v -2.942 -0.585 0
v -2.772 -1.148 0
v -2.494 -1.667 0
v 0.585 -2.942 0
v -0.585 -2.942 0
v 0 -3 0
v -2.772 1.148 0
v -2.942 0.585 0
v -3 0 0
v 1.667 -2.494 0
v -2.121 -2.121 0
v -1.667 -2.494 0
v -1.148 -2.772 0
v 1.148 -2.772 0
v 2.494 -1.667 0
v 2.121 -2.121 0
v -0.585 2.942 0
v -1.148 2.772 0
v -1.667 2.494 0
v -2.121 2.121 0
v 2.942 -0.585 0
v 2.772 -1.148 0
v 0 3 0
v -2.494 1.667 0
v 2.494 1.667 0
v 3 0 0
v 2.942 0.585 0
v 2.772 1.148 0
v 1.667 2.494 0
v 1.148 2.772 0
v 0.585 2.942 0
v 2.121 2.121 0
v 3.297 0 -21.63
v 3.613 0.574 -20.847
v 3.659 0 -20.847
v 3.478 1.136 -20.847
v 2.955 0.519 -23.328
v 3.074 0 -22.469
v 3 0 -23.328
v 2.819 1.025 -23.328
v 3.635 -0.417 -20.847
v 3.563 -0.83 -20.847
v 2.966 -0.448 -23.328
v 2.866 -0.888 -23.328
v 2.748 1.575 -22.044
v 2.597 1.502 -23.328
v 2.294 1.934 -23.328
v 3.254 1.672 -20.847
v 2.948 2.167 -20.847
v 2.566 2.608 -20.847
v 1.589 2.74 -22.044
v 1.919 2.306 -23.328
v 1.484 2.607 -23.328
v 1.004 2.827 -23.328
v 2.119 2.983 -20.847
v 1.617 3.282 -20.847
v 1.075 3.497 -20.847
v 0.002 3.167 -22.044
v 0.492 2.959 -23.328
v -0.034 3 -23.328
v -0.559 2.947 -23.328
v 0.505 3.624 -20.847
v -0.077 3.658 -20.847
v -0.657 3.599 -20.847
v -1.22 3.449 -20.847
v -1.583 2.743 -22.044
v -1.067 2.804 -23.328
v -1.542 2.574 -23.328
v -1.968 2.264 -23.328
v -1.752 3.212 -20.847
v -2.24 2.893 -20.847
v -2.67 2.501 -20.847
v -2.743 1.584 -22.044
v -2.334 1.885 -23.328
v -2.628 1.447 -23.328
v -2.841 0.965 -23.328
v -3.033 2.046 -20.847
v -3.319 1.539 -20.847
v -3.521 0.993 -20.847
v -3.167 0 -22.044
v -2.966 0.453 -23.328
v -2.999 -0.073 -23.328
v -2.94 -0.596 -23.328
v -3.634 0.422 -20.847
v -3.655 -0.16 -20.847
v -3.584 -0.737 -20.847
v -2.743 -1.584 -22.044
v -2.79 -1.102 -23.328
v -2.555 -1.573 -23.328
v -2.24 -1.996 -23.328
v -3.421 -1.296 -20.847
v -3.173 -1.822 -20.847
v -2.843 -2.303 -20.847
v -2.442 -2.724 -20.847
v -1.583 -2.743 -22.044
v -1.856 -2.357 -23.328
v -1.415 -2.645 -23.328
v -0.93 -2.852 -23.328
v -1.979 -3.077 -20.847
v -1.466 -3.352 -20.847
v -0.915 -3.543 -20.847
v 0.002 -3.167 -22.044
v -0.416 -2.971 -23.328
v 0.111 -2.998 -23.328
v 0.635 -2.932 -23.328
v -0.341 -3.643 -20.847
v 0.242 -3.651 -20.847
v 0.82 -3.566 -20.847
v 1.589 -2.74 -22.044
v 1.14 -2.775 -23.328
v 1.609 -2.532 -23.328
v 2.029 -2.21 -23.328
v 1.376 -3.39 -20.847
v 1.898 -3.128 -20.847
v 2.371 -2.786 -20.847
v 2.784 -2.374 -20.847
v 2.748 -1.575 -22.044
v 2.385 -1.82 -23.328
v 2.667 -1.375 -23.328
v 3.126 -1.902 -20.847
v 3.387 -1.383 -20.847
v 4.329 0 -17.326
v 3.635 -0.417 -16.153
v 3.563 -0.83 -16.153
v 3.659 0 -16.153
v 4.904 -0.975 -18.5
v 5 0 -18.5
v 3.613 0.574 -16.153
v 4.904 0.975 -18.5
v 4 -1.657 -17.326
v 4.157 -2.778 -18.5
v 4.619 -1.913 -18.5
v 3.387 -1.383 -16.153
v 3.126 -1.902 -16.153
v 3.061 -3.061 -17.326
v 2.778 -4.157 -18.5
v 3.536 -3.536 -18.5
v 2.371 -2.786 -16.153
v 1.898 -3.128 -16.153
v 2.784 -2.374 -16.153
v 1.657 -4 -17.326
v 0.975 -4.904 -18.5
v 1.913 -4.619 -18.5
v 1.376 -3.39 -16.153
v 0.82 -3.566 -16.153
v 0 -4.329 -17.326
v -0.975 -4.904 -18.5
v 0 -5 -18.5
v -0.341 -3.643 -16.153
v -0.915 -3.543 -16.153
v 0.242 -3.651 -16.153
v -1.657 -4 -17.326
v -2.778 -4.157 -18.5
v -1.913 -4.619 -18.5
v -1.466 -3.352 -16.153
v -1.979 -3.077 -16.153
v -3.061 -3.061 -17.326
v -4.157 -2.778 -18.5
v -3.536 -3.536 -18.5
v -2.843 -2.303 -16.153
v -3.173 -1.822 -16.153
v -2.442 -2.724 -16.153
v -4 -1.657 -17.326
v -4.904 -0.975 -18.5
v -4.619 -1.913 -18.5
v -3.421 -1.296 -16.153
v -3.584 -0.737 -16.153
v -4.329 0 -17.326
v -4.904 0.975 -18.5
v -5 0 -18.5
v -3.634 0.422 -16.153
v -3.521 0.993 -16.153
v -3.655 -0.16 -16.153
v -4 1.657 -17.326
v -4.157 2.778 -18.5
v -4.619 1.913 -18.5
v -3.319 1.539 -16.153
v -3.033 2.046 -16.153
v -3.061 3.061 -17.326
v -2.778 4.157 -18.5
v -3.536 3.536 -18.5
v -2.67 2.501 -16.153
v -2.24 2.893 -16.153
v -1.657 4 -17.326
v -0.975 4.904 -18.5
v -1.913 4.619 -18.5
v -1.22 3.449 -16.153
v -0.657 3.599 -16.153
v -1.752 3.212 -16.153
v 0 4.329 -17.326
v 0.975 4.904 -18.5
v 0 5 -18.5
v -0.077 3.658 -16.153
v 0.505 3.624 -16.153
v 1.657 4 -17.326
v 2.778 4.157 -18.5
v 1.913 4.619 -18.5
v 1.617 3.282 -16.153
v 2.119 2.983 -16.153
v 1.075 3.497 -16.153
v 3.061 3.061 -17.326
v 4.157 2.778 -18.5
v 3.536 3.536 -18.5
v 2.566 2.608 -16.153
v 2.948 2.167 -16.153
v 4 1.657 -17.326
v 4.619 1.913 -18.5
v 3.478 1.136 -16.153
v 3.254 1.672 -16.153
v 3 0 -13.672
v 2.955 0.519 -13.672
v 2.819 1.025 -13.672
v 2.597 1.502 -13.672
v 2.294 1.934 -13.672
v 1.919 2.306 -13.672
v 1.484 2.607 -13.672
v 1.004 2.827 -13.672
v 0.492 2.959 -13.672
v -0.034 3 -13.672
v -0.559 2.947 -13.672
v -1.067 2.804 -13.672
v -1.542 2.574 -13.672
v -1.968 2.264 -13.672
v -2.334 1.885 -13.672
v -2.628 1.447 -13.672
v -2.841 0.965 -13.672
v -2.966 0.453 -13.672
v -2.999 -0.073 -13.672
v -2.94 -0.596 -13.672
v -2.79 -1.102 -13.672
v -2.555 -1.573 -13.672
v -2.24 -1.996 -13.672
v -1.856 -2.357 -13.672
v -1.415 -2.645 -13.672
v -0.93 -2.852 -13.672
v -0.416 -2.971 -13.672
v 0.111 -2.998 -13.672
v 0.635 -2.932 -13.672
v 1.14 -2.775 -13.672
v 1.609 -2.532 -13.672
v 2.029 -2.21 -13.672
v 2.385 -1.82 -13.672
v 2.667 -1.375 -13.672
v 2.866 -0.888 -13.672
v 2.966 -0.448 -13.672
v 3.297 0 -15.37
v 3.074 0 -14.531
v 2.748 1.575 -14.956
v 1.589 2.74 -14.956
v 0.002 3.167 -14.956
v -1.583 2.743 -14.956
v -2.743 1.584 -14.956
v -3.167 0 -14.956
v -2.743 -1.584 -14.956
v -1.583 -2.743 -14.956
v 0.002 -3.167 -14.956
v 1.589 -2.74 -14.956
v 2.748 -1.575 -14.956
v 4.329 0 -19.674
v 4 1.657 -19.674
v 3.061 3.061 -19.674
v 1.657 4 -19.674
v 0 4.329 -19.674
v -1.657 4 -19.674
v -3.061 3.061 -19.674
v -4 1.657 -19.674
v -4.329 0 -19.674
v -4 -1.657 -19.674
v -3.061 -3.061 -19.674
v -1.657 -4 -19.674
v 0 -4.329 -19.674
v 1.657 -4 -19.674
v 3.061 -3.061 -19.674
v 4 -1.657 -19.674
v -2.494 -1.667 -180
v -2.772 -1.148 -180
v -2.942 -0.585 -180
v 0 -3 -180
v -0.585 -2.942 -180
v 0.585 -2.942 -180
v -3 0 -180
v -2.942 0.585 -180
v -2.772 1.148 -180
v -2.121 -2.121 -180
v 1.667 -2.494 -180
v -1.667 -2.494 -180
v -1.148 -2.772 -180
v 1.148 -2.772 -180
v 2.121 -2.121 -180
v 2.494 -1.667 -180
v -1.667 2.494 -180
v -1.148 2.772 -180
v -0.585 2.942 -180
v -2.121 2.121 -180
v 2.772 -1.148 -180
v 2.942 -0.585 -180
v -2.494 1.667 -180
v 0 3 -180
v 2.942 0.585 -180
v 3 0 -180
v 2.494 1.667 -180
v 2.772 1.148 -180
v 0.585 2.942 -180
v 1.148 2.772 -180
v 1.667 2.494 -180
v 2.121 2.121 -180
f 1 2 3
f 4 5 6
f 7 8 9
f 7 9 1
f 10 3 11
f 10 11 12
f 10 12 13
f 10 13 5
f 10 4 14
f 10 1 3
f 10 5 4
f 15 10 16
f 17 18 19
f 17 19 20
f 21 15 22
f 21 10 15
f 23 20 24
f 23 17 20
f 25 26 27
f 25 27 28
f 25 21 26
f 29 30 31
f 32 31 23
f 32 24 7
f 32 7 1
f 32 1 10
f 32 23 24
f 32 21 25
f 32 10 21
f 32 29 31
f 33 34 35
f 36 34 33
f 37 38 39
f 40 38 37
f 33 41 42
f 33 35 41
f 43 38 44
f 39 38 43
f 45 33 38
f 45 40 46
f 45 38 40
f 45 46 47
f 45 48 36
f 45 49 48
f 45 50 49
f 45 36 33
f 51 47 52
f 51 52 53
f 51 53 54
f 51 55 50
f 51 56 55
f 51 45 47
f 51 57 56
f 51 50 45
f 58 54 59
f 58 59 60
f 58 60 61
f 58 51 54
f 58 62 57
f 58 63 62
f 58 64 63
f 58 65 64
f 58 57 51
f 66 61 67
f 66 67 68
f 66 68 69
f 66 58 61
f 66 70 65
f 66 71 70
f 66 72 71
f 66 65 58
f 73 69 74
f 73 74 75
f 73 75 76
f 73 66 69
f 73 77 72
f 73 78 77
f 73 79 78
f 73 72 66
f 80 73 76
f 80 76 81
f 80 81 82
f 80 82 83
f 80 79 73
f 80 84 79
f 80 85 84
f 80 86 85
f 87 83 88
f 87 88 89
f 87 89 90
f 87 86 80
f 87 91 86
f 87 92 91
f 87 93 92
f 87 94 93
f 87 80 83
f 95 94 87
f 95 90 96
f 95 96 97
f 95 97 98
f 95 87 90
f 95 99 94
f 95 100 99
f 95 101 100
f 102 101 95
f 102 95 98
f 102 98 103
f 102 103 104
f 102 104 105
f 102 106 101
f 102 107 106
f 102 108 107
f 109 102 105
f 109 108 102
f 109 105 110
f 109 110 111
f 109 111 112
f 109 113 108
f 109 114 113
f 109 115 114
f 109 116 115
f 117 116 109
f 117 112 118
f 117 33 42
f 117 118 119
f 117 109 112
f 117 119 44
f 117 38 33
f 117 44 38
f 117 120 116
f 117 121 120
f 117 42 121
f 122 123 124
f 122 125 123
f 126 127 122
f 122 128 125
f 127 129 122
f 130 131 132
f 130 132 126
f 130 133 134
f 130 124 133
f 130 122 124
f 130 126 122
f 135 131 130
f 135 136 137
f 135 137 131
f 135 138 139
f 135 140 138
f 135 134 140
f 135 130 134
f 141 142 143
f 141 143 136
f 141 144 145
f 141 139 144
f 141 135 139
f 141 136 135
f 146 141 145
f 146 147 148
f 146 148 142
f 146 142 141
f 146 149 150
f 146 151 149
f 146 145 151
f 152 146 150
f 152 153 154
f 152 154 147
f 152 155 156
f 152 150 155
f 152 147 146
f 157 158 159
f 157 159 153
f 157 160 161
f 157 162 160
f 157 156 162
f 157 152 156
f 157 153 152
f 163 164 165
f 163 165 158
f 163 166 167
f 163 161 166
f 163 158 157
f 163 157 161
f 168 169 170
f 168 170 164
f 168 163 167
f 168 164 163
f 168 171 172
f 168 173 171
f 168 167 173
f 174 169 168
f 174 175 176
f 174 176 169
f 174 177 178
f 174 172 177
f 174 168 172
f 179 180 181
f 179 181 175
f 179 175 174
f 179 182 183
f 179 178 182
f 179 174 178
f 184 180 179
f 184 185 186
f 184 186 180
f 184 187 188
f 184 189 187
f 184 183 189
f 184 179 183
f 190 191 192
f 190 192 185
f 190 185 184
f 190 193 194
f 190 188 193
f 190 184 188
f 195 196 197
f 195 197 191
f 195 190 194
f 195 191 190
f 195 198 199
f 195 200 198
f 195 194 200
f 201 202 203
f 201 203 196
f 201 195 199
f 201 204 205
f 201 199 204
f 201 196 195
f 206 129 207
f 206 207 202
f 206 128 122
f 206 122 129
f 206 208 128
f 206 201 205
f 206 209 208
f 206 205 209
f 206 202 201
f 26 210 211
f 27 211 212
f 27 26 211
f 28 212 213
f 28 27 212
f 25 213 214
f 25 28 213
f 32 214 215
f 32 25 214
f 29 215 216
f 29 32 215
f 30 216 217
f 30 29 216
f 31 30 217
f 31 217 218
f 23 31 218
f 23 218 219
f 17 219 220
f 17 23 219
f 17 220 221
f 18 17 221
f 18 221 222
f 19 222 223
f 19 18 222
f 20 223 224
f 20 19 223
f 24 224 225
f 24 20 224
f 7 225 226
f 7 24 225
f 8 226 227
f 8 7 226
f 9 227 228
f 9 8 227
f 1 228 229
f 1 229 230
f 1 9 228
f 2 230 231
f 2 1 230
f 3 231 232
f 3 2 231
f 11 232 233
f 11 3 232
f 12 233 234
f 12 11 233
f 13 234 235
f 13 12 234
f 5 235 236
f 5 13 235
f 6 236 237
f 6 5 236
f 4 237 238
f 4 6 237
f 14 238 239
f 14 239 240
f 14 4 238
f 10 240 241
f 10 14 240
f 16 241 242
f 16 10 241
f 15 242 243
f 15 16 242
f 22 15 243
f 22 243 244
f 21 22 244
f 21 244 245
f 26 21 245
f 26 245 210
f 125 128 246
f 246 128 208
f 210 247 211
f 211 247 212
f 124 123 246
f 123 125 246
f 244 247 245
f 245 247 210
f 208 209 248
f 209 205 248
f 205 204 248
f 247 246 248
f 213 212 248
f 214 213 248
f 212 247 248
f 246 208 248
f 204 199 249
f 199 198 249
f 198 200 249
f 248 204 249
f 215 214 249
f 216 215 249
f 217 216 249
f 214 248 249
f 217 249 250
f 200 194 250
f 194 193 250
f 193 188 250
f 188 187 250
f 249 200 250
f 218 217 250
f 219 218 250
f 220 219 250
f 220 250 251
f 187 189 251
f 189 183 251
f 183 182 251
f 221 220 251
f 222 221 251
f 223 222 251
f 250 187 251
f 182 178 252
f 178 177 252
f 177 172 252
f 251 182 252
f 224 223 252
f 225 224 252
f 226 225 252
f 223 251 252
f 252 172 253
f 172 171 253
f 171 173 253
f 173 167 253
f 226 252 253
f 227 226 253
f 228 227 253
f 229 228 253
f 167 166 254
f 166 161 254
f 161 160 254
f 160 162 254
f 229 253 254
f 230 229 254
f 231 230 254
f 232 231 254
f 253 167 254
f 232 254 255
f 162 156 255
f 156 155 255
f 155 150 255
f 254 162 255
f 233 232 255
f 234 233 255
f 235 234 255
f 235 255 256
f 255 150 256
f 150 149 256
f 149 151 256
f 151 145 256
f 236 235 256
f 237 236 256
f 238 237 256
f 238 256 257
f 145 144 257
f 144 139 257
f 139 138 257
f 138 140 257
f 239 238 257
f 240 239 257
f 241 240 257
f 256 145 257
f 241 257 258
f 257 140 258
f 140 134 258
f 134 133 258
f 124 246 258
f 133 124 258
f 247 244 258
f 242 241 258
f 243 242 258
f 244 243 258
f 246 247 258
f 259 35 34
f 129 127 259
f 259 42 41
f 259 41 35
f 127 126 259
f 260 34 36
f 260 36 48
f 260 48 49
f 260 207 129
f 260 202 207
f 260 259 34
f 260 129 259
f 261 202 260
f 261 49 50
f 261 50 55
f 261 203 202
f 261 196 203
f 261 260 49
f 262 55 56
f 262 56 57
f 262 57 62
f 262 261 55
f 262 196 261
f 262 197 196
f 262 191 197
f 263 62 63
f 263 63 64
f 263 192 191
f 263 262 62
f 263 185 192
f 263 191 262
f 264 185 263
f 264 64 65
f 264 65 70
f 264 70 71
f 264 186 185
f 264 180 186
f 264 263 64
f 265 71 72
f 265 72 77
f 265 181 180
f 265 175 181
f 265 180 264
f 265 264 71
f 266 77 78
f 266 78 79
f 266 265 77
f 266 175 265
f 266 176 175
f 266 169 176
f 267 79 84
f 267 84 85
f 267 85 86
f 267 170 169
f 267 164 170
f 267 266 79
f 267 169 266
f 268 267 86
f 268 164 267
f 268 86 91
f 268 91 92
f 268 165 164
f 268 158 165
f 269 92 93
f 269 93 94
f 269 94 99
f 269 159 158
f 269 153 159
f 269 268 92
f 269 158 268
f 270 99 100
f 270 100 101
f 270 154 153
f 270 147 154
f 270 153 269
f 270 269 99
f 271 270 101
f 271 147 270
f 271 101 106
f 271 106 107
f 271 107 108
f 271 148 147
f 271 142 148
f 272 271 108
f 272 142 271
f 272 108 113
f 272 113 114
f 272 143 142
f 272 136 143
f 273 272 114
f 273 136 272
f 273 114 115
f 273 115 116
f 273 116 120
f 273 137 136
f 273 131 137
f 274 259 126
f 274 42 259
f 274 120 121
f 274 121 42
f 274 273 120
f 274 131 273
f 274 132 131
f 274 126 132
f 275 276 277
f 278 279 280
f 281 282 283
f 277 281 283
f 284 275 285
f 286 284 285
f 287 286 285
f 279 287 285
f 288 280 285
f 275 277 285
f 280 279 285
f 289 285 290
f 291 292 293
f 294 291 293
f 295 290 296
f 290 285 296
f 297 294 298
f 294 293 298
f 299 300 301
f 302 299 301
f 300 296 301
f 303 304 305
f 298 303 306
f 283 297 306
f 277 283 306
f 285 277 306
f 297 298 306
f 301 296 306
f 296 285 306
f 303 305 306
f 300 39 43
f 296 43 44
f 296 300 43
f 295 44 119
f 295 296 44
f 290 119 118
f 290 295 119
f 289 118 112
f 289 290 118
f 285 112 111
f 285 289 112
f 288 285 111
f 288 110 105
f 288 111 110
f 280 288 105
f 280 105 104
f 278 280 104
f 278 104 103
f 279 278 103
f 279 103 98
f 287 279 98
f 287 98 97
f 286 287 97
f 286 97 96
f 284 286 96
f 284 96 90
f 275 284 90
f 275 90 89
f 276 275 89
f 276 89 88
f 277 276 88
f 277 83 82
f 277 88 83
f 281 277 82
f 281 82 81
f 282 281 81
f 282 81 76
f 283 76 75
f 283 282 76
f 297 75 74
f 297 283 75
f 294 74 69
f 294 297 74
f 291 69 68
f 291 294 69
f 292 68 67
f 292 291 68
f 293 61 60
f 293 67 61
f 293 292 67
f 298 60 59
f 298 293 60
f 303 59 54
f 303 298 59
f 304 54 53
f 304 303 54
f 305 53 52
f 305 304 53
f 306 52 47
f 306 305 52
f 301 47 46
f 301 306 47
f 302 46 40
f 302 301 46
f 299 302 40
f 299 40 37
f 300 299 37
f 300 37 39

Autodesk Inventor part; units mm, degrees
ref_plane "YZ Plane" through (0, 0, 0) normal (1, 0, 0) x (0, 1, 0)
ref_plane "XZ Plane" through (0, 0, 0) normal (0, 1, 0) x (-1, 0, 0)
ref_plane "XY Plane" through (0, 0, 0) normal (0, 0, 1) x (1, 0, 0)
sketch "Sketch1" plane through (0, 0, 0) normal (0, 1, 0) x (-1, 0, 0)
  line L0 (-3, -22) -> (-3, -180)
  line L1 (-3, -180) -> (0, -180)
  line L2 (0, -180) -> (0, 0)
  line L3 (-5, -18.5) -> (0, -18.5) construction
  line L4 (-5, -18.5) -> (-5, -20.565) construction
  line L5 (-3, -22) -> (-5, -18.5)
  line L6 (-5, -18.5) -> (-3, -15)
  line L7 (-3, -15) -> (-3, 0)
  line L8 (-3, 0) -> (0, 0)
  dimension "d5" = 180
  dimension "d8" = 5
  dimension "d12" = 6
  dimension "d14" = 15
  dimension "d15" = 7
revolve "Revolution1" add sketch "Sketch1" angle 360 about axis through (0, 0, -180) along (0, 0, 1)
fillet "Fillet2" radius 5 2 edges at (-3, 0, -22) (-3, 0, -15)
properties part number "SealantApplicator"
